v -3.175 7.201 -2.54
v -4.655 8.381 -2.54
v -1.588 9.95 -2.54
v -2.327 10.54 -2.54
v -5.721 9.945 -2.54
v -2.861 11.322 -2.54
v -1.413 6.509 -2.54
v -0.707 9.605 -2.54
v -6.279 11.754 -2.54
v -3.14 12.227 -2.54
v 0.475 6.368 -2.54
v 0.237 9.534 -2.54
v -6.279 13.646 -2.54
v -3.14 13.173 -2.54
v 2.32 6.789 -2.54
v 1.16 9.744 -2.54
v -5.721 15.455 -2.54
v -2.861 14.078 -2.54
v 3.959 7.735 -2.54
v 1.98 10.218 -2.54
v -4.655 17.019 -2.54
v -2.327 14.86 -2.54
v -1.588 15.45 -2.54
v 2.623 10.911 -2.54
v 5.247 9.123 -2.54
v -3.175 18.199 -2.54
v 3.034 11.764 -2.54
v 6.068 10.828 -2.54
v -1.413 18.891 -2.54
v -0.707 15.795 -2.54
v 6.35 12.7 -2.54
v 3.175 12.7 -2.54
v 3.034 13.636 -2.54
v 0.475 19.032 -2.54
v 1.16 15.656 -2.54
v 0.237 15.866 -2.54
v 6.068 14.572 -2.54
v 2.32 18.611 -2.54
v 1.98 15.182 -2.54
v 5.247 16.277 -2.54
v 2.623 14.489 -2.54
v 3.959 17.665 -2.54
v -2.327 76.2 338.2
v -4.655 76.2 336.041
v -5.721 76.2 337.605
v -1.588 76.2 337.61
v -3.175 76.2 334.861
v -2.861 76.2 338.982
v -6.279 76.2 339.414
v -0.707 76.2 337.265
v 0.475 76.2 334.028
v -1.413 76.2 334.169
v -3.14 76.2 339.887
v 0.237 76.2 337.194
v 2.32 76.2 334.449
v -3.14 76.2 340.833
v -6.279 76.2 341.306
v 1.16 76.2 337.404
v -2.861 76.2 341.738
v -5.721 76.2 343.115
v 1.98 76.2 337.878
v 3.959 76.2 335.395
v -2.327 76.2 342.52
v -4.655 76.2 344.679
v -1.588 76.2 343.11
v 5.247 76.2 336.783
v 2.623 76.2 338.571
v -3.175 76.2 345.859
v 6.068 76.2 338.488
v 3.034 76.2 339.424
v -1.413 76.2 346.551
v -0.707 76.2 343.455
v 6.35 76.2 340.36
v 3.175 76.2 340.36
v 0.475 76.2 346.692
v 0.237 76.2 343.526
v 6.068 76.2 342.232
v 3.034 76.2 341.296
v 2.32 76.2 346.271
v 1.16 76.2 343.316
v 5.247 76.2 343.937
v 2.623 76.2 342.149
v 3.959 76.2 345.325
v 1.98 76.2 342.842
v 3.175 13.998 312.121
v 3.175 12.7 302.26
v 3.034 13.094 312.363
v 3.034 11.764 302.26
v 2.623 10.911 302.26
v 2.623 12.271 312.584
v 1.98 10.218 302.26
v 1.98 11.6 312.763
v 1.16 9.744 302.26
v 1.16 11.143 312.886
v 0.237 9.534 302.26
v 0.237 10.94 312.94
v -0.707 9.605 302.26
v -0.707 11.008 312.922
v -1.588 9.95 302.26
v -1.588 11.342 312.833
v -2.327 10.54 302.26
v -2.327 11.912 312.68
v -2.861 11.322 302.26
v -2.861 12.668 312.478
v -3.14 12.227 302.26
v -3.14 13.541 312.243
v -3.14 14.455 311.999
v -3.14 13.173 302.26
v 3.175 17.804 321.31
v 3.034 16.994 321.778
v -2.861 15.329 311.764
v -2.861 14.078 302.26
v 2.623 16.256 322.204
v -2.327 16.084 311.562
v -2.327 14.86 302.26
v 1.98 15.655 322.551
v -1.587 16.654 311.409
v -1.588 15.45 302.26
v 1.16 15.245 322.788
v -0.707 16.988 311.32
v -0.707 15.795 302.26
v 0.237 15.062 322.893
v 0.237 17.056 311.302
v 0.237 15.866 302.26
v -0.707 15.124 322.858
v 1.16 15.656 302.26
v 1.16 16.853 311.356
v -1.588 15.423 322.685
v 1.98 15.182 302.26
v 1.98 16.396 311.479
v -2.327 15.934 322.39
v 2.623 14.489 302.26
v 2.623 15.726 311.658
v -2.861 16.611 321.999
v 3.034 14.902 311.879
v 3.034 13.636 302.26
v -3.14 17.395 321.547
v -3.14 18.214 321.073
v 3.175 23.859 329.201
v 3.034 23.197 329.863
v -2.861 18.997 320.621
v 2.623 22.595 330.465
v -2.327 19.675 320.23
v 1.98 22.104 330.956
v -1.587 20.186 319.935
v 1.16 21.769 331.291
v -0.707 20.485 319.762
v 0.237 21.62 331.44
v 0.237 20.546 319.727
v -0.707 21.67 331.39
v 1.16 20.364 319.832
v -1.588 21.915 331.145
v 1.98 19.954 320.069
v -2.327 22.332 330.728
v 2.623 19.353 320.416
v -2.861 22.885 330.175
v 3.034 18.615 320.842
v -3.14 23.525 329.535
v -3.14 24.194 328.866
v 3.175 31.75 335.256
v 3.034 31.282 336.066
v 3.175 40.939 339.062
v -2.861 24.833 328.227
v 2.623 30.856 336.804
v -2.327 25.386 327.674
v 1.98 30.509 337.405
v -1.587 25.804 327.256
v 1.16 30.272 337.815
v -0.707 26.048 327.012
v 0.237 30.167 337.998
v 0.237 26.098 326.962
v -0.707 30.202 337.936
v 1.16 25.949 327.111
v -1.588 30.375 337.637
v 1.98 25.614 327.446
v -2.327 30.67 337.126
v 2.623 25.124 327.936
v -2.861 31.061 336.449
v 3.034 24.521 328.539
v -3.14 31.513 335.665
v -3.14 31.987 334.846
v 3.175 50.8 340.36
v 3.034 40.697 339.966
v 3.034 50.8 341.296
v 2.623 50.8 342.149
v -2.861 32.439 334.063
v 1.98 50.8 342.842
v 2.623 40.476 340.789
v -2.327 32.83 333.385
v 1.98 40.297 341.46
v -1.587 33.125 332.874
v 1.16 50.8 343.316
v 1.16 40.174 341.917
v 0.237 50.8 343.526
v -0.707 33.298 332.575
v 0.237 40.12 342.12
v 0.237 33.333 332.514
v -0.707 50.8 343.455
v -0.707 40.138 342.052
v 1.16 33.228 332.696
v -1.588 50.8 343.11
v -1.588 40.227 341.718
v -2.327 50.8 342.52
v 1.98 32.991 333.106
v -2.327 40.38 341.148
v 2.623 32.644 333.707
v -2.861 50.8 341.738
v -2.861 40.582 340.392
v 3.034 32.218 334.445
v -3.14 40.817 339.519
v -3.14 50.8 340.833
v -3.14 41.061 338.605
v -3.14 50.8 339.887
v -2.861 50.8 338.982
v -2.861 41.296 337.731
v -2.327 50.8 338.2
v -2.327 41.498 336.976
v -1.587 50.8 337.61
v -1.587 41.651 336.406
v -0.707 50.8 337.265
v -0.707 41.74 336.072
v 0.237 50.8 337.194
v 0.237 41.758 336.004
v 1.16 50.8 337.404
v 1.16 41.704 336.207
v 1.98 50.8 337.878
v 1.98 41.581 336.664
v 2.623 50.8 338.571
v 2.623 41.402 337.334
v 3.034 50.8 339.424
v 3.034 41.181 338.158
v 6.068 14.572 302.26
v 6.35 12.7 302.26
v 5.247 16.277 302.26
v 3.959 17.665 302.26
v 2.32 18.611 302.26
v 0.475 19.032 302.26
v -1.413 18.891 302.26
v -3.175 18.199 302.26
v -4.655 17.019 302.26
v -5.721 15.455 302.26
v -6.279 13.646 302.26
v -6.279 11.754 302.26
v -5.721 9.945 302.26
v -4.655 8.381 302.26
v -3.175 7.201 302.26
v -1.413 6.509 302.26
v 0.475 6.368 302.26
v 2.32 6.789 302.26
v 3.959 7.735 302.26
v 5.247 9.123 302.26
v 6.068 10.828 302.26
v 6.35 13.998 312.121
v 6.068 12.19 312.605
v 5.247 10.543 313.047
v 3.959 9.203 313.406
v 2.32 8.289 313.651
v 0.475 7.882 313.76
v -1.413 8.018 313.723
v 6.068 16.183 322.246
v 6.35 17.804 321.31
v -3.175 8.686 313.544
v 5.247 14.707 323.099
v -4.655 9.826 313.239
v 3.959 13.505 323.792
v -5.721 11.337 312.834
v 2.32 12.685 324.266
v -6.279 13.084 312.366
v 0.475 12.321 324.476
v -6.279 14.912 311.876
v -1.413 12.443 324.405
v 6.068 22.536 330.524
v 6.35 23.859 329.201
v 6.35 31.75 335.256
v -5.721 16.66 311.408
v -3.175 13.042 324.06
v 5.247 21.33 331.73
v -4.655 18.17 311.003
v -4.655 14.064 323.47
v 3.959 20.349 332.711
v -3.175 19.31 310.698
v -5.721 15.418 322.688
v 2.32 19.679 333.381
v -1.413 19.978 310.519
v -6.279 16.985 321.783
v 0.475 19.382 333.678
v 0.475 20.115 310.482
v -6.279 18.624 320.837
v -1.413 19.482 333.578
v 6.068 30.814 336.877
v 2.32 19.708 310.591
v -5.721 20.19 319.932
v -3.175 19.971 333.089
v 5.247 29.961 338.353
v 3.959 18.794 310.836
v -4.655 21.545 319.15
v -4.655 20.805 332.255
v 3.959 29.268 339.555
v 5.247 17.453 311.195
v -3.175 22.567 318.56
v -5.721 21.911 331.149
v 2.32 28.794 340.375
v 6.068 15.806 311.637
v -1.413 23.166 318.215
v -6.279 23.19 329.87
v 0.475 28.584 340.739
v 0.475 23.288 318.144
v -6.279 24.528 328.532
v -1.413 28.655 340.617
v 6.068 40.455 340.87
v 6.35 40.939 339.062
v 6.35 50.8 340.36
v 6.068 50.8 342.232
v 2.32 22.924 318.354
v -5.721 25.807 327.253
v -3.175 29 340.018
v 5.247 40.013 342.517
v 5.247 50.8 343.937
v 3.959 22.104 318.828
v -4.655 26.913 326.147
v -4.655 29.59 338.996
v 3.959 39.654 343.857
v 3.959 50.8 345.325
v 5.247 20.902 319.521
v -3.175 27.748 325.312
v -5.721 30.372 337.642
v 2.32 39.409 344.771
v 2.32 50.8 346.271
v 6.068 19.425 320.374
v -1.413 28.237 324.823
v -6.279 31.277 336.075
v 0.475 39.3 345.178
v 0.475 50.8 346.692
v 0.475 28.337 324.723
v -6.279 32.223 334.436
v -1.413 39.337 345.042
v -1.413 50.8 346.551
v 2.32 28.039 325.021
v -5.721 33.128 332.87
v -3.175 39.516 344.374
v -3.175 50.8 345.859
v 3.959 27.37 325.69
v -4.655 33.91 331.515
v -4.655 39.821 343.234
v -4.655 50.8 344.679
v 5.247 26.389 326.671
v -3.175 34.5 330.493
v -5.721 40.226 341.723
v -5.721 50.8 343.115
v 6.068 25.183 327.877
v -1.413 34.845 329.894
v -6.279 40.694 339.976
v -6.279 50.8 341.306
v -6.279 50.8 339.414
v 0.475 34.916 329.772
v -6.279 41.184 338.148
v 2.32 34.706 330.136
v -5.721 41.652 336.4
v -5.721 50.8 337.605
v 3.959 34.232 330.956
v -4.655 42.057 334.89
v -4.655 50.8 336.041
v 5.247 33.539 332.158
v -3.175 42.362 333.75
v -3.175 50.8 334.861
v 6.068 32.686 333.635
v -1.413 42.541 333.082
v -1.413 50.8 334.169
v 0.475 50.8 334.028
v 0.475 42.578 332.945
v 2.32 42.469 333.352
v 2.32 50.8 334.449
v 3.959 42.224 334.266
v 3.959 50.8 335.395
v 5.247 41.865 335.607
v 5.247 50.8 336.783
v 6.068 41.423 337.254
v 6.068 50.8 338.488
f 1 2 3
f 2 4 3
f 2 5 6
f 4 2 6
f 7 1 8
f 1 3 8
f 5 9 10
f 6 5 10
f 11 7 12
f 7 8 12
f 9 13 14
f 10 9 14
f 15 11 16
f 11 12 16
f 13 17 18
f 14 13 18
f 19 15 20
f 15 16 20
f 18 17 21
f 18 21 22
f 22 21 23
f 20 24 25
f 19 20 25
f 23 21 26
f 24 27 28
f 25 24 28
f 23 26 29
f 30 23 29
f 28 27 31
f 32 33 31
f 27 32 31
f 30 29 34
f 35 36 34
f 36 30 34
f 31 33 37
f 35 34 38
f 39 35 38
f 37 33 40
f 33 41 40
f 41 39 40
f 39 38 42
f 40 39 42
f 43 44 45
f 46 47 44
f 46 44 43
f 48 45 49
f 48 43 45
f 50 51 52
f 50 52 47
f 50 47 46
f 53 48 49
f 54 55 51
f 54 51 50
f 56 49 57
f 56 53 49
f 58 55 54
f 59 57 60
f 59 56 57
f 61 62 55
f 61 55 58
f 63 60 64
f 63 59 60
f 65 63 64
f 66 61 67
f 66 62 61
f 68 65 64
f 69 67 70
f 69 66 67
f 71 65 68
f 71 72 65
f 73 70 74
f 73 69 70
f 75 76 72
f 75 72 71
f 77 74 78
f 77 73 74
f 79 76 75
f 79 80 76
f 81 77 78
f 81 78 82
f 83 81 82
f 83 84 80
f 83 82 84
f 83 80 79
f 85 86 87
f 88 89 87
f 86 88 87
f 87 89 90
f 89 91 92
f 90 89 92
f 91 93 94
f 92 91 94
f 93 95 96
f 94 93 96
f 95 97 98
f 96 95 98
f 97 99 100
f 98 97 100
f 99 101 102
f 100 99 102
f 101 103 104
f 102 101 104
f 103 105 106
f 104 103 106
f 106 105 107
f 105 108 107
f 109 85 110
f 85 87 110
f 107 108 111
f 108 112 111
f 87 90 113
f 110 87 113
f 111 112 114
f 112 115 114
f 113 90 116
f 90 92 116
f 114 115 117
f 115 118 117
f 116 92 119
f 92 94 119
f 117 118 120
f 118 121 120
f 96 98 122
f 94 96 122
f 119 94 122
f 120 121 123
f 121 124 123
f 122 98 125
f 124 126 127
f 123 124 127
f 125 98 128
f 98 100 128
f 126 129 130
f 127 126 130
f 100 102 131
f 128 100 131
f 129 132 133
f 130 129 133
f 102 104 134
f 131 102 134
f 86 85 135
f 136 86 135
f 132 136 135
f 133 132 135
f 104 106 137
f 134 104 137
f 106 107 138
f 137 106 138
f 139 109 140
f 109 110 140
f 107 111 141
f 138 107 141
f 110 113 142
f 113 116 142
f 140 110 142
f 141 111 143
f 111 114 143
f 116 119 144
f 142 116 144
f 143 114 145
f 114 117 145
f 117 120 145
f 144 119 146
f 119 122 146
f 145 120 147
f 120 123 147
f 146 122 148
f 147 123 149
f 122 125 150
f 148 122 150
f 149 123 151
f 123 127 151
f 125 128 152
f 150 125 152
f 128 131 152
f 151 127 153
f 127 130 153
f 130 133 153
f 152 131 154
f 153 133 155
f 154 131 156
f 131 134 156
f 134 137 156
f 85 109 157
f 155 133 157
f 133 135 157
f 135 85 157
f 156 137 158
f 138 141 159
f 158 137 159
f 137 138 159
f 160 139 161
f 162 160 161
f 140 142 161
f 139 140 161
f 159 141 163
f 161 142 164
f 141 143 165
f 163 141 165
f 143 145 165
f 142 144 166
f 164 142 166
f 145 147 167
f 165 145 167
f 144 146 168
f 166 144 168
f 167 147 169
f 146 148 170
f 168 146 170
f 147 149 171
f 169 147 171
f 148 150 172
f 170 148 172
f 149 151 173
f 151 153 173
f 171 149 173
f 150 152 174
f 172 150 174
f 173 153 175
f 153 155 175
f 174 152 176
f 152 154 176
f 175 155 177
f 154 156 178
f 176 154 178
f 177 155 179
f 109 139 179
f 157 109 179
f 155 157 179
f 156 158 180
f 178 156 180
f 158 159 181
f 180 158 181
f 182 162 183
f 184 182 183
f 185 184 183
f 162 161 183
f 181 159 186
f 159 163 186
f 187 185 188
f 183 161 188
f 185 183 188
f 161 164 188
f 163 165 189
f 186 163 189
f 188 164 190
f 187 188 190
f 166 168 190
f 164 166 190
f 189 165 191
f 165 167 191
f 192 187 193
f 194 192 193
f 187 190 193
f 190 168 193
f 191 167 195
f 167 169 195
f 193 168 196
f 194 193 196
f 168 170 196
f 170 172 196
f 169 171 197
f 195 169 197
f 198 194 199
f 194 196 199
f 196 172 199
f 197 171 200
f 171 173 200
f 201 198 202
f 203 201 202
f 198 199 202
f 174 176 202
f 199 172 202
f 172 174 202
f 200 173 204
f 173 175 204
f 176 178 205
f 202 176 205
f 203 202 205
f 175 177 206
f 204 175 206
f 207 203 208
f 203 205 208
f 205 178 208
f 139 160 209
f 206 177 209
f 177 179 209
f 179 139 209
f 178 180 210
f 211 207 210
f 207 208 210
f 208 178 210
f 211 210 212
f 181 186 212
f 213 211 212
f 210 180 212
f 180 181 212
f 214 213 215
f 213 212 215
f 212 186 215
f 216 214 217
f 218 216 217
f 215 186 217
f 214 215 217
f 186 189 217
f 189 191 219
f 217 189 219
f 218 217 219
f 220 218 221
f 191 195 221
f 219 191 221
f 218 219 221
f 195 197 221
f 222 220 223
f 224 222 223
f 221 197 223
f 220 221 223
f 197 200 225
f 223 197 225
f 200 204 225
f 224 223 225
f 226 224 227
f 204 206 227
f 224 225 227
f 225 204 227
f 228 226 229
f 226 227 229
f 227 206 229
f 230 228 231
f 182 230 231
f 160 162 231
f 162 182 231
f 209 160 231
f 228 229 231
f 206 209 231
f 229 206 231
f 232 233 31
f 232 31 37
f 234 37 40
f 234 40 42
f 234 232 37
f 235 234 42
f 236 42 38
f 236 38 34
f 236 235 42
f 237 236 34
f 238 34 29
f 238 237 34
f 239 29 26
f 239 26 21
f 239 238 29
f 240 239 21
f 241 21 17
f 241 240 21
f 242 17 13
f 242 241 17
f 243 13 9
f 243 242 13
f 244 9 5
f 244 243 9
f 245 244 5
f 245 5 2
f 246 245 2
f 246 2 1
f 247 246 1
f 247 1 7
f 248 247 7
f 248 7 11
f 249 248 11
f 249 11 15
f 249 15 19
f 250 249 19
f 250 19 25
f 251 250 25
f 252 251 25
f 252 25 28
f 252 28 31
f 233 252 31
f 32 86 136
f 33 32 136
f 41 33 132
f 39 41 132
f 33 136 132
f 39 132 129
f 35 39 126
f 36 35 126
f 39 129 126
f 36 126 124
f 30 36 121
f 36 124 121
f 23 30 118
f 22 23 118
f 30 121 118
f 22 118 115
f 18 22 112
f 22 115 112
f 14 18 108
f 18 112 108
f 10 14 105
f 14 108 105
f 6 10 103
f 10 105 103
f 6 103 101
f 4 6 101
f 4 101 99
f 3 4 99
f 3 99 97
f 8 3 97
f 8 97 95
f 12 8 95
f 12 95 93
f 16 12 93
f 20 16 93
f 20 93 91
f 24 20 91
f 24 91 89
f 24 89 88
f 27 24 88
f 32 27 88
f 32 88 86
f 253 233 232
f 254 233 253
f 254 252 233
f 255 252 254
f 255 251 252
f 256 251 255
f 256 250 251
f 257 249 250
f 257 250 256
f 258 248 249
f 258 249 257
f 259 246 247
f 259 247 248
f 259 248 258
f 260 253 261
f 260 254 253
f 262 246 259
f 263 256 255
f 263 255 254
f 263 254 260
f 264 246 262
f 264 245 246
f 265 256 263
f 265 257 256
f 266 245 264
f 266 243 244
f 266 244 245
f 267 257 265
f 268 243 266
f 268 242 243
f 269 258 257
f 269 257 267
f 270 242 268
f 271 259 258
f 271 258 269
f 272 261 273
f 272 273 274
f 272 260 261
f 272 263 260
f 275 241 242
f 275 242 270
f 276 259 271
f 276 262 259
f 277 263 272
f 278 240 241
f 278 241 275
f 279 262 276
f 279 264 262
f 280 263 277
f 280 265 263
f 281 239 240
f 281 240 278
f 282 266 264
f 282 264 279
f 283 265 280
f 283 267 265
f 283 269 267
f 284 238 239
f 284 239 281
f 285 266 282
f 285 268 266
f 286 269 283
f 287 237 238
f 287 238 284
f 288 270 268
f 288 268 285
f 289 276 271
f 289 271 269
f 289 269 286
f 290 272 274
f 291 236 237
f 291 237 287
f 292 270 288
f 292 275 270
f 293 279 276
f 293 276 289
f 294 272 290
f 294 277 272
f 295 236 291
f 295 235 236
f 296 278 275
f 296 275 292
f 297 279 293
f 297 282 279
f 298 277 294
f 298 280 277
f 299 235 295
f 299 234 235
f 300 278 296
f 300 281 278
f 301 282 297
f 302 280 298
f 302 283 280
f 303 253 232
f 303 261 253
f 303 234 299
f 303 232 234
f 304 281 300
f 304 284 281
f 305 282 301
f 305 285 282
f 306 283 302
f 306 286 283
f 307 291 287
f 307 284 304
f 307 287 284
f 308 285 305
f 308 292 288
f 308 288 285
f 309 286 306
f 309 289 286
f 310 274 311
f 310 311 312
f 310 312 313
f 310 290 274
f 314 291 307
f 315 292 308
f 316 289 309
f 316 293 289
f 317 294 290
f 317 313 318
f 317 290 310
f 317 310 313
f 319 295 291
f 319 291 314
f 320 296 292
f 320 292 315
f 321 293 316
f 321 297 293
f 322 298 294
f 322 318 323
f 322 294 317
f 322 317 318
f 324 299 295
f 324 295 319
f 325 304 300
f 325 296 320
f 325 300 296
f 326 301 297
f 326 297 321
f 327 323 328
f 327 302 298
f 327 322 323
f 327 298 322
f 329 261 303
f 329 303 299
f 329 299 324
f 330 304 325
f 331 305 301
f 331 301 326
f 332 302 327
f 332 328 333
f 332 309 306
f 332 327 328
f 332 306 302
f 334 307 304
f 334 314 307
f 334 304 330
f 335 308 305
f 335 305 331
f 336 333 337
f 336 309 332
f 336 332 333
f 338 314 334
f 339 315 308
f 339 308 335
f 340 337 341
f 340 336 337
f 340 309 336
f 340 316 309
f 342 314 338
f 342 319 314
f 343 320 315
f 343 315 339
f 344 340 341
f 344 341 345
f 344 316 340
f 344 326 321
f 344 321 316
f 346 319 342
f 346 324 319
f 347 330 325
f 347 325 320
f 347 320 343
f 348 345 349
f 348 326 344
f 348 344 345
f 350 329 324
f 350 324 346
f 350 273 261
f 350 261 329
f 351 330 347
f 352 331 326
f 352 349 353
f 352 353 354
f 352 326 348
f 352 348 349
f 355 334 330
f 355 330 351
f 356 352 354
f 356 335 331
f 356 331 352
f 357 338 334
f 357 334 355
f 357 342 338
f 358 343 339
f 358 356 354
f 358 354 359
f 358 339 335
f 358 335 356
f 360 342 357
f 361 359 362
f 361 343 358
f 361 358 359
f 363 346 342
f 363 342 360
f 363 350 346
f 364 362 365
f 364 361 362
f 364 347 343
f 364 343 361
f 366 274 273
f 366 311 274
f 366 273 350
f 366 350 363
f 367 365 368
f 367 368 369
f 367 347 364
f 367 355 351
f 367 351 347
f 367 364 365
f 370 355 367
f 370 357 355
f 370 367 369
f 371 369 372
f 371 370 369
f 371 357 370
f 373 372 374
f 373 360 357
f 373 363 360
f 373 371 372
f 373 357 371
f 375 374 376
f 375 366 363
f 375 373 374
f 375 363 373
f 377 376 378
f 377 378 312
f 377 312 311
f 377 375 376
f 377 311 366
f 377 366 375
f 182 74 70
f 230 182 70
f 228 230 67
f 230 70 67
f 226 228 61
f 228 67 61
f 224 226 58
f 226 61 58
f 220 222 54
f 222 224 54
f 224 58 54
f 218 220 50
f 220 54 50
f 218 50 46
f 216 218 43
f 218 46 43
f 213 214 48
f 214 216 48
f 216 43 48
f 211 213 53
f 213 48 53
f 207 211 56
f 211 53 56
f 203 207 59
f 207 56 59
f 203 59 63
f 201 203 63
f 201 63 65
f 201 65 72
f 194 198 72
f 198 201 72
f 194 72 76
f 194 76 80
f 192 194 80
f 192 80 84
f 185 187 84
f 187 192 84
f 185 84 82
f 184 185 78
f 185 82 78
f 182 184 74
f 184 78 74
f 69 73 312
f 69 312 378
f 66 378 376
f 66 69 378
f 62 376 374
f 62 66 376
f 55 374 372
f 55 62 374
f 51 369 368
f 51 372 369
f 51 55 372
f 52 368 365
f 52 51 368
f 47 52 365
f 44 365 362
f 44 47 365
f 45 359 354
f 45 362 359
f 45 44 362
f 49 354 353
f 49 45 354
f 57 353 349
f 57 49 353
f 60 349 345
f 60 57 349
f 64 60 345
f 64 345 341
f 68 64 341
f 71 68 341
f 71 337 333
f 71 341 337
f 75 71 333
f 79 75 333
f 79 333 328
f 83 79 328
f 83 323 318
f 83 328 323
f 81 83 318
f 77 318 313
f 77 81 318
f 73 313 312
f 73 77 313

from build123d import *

# Parameters (mm, degrees)
SWEEP1_PROFILE_R     = 6.35
CUT_SWEEP1_PROFILE_R = 3.175


with BuildPart() as part:
    # Sweep1: sweep along a curve in space
    with BuildLine() as sweep1_path:
        Line((0, 50.8, 340.36), (0, 76.2, 340.36))
        ThreePointArc((0, 12.7, 302.26), (0, 23.859231637, 329.200768363), (0, 50.8, 340.36))
        Line((0, 12.7, 302.26), (0, 12.7, -2.54))
    # Sweep1 profile (on start of the path) → Sweep1 (sweep)
    with BuildSketch(Plane(origin=(0, 12.7, -2.54), x_dir=(1, 0, 0), z_dir=(0, 0, 1))):
        Circle(SWEEP1_PROFILE_R)
    sweep(path=sweep1_path.line)

    # Cut-Sweep1: sweep along a curve in space
    with BuildLine() as cut_sweep1_path:
        Line((0, 50.8, 340.36), (0, 76.2, 340.36))
        ThreePointArc((0, 12.7, 302.26), (0, 23.859231637, 329.200768363), (0, 50.8, 340.36))
        Line((0, 12.7, 302.26), (0, 12.7, -2.54))
    # Cut-Sweep1 profile (on start of the path) → Cut-Sweep1 (sweep, cut)
    with BuildSketch(Plane(origin=(0, 12.7, -2.54), x_dir=(1, 0, 0), z_dir=(0, 0, 1))):
        Circle(CUT_SWEEP1_PROFILE_R)
    sweep(path=cut_sweep1_path.line, mode=Mode.SUBTRACT)


solid = part.part
